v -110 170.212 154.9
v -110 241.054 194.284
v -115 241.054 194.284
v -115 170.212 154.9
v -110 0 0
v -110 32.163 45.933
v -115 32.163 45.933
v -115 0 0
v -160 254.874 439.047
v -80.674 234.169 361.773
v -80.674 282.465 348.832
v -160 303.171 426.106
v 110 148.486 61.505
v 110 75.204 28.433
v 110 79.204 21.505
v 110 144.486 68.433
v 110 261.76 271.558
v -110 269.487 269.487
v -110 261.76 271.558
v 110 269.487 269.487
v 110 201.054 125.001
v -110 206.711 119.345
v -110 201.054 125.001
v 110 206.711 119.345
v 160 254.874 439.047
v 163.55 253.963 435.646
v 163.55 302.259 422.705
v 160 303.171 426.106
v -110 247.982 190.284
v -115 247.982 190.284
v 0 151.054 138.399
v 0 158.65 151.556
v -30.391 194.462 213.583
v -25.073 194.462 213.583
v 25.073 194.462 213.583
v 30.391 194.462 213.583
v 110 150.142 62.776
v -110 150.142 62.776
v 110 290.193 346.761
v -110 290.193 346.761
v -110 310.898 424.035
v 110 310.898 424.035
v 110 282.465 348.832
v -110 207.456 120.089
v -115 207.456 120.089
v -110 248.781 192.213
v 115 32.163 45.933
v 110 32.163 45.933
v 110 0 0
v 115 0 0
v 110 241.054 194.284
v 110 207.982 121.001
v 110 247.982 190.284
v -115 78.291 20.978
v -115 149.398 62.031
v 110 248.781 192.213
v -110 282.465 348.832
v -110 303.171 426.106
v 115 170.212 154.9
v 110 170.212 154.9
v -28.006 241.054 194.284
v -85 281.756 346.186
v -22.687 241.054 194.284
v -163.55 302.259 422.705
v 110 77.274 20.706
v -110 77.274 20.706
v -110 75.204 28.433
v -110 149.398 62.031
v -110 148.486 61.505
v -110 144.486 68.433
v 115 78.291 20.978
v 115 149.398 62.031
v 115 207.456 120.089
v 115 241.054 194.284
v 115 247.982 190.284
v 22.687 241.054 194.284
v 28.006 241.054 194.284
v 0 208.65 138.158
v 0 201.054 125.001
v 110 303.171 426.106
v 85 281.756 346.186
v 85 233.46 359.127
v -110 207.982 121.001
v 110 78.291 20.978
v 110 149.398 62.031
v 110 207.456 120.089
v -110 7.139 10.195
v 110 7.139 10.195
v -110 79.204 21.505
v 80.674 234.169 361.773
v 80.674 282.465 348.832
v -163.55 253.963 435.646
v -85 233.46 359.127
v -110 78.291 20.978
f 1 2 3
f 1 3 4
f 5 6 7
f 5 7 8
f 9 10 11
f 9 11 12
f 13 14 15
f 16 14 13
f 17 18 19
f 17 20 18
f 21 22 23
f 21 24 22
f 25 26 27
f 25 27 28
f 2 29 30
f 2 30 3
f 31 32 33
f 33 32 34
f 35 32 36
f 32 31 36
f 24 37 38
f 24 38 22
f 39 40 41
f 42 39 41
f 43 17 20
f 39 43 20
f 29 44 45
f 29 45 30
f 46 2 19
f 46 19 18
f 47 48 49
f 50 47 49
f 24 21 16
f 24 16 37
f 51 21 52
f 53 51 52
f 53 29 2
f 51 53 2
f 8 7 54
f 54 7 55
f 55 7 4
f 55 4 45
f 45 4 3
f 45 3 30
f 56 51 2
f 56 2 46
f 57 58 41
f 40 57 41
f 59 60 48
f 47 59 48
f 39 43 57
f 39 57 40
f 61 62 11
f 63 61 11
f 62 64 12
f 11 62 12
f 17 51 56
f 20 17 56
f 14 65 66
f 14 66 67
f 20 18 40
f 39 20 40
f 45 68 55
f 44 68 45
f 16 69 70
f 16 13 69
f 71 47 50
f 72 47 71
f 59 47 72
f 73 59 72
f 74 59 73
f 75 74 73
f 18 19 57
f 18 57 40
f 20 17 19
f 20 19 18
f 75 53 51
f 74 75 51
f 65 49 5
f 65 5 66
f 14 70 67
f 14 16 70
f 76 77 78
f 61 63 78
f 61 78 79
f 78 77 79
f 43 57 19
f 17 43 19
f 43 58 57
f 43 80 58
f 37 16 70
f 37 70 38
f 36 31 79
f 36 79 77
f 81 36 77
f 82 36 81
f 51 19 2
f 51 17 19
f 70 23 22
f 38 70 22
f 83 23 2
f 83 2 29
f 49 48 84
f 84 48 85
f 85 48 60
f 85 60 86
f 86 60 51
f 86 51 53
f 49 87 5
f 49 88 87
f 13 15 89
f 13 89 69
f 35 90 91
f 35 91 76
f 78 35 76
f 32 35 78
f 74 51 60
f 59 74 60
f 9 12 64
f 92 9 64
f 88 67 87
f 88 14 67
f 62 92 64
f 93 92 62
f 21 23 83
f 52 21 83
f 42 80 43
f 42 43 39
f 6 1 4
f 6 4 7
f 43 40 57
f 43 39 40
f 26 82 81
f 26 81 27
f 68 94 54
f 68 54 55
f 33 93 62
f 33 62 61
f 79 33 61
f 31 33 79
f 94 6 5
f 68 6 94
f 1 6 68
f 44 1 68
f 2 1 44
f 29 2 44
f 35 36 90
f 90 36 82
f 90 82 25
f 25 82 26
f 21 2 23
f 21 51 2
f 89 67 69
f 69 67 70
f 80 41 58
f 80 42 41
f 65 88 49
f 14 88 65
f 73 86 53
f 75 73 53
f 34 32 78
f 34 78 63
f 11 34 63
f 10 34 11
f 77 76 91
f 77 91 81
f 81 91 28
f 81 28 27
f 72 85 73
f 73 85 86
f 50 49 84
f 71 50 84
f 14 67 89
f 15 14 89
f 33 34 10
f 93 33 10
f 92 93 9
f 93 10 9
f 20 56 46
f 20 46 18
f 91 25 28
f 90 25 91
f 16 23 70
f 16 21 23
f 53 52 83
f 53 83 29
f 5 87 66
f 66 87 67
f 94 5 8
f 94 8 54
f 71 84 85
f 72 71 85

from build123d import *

# Parameters (mm, degrees)
F2_DEPTH       = 110
F4_DEPTH       = 110
F6_DEPTH       = 110
F8_DEPTH       = 110
F10_DEPTH      = 110
F12_DEPTH      = 110
F14_DEPTH      = 5
F17_DEPTH      = 110
F20_DEPTH      = 119
F22_DEPTH      = 273.5514659616
F22_DEPTH_BACK = 53.5514659616


with BuildPart() as f2:
    # F1 (on Right) → F2 (new body, symmetric)
    with BuildSketch(Plane.YZ):
        Polygon((7.1386122285, 10.194994825), (0, 0), (77.2740661031, 20.7055236082), (75.2035137423, 28.4329302185), align=None)
    extrude(amount=F2_DEPTH, both=True)


with BuildPart() as f4:
    # F3 (on Right) → F4 (new body, symmetric)
    with BuildSketch(Plane.YZ):
        Polygon((144.4855460451, 68.4329302185), (75.2035137423, 28.4329302185), (79.2035137423, 21.5047269882), (148.4855460451, 61.5047269882), align=None)
    extrude(amount=F4_DEPTH, both=True)


with BuildPart() as f6:
    # F5 (on Right) → F6 (new body, symmetric)
    with BuildSketch(Plane.YZ):
        Polygon((201.05408854, 125.0014727134), (144.4855460451, 68.4329302185), (150.1424002946, 62.776075969), (206.7109427895, 119.3446184639), align=None)
    extrude(amount=F6_DEPTH, both=True)


with BuildPart() as f8:
    # F7 (on Right) → F8 (new body, symmetric)
    with BuildSketch(Plane.YZ):
        Polygon((241.05408854, 194.2835050162), (201.05408854, 125.0014727134), (207.9822917703, 121.0014727134), (247.9822917703, 190.2835050162), align=None)
    extrude(amount=F8_DEPTH, both=True)


with BuildPart() as f10:
    # F9 (on Right) → F10 (new body, symmetric)
    with BuildSketch(Plane.YZ):
        Polygon((261.7596121482, 271.5575711193), (241.05408854, 194.2835050162), (248.7814951503, 192.2129526554), (269.4870187585, 269.4870187585), align=None)
    extrude(amount=F10_DEPTH, both=True)


with BuildPart() as f12:
    # F11 (on Right) → F12 (new body, symmetric)
    with BuildSketch(Plane.YZ):
        Polygon((282.4651357564, 348.8316372224), (261.7596121482, 271.5575711193), (269.4870187585, 269.4870187585), (290.1925423667, 346.7610848616), align=None)
    extrude(amount=F12_DEPTH, both=True)


with BuildPart() as f14:
    # F13 (on face) → F14 (new body)
    with BuildSketch(Plane.YZ.offset(110)):
        Polygon((32.1625771399, 45.932920434), (0, 0), (78.2913984832, 20.9781169979), (149.3976613041, 62.0313369786), (207.4556817799, 120.0893574544), (247.9822917703, 190.2835050162), (241.05408854, 194.2835050162), (170.2120928418, 154.900309174), align=None)
    extrude(amount=F14_DEPTH)


with BuildPart() as f15_1:
    # F15: instance of F14
    add(f14.part.mirror(Plane.YZ))


with BuildPart() as f17:
    # F16 (on Right) → F17 (new body, symmetric)
    with BuildSketch(Plane.YZ):
        Polygon((303.1706593646, 426.1057033256), (282.4651357564, 348.8316372224), (290.1925423667, 346.7610848616), (310.8980659749, 424.0351509647), align=None)
    extrude(amount=F17_DEPTH, both=True)


with BuildPart() as f20:
    # F19 (on offset) → F20 (new body, through all)
    with BuildSketch(Plane(origin=(0, 61.3904768684, -16.4495286999), x_dir=(1, 0, 0), z_dir=(0, -0.9659258263, 0.2588190451))):
        Polygon((-163.5504659616, 486.5323056132), (-85, 407.3140967376), (0, 172.778778028), (85, 407.3140967376), (163.5504659616, 486.5323056132), (160, 490.0528441311), (80.6743327561, 410.0528441311), (0, 187.4530753706), (-80.6743327561, 410.0528441311), (-160, 490.0528441311), align=None)
    extrude(amount=-F20_DEPTH)

    # F21 (on face) → F22 (cut, two sides)
    with BuildSketch(Plane.YZ.offset(110)) as f22_sk:
        Polygon((369.9040717553, 104.2930381831), (241.05408854, 194.2835050162), (201.05408854, 125.0014727134), (274.6826482486, 80.5175428409), align=None)
        Polygon((194.4615059111, 213.5827846471), (260.747820074, 460.9666769495), (140.7673657296, 543.3600070076), (18.2077363489, 145.2441187697), (128.9983988164, 100.1973571377), align=None)
    extrude(amount=-F22_DEPTH, mode=Mode.SUBTRACT)
    extrude(f22_sk.sketch, amount=F22_DEPTH_BACK, mode=Mode.SUBTRACT)


solid = Compound([f2.part, f4.part, f6.part, f8.part, f10.part, f12.part, f14.part, f15_1.part, f17.part, f20.part])
